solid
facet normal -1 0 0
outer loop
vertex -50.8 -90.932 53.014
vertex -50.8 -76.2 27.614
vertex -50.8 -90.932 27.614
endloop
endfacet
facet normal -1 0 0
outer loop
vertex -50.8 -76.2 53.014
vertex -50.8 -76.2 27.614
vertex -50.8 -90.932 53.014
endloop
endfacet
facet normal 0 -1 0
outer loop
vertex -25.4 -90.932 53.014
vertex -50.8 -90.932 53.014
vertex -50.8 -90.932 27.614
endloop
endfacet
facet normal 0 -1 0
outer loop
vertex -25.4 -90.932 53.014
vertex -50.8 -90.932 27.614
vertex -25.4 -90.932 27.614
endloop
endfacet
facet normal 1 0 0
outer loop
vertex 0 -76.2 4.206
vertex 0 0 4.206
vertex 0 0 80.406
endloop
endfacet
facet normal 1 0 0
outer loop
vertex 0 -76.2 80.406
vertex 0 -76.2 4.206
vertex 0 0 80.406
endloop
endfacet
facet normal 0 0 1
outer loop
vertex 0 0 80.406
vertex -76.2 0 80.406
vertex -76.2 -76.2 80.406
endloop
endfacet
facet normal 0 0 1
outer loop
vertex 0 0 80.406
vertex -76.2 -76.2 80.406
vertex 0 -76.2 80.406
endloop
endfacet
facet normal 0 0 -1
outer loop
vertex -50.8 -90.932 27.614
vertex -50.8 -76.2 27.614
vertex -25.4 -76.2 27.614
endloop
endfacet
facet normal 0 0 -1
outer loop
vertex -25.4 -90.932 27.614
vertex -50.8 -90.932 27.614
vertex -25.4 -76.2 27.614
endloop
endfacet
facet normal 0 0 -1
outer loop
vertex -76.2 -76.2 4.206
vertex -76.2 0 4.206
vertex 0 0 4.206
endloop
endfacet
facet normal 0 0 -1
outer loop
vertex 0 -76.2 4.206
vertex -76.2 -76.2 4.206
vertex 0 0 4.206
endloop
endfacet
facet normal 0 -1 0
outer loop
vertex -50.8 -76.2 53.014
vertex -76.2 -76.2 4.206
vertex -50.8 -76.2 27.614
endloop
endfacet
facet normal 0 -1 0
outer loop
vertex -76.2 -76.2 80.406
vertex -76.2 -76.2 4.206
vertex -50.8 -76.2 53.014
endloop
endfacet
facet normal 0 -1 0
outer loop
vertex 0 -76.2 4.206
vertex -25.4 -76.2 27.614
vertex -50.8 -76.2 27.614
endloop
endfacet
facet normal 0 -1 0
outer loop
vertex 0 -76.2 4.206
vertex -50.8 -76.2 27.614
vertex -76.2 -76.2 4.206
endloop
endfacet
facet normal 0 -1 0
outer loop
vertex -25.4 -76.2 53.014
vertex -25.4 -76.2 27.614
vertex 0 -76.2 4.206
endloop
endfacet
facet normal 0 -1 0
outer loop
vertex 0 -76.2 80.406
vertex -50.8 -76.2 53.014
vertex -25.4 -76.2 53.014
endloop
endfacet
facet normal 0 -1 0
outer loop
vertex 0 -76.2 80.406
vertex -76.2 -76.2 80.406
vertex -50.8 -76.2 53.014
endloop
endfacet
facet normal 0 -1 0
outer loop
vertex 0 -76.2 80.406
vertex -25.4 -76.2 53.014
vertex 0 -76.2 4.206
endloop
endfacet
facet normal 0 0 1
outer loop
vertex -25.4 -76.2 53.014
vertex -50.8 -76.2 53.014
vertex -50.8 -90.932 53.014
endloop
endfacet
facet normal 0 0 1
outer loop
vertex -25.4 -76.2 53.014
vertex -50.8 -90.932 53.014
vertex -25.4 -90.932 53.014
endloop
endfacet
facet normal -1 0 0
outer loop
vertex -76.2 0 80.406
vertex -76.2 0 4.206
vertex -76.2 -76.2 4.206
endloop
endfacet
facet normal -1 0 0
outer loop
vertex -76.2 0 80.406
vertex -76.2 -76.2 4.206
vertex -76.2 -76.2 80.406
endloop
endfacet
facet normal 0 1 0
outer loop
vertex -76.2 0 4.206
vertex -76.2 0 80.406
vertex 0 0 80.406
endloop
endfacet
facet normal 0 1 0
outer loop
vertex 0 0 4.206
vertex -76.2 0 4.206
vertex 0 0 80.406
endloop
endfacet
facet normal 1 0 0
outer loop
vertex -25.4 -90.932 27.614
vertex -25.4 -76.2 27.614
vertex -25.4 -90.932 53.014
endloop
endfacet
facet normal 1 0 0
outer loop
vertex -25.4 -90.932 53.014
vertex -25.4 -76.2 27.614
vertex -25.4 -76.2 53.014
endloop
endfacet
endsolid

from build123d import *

# Parameters (mm, degrees)
F0_W     = 76.2
F0_H     = 76.2
F1_DEPTH = 25.4
F2_DEPTH = 76.2
F3_W     = 25.4
F3_H     = 25.4
F4_DEPTH = 14.732


# Not quite as in the source:
# - the program builds the solid bodies; features that only make, move or delete a surface that nothing else refers to are left out


with BuildPart() as f1:
    # F0 (on Front) → F1 (new body)
    with BuildSketch(Plane.XZ):
        with Locations((-38.1, 42.3055109791)):
            Rectangle(F0_W, F0_H)
    extrude(amount=F1_DEPTH)

    # F0 (on Front) → F2 (join)
    with BuildSketch(Plane.XZ):
        with Locations((-38.1, 42.3055109791)):
            Rectangle(F0_W, F0_H)
    extrude(amount=F2_DEPTH)

    # F3 (on face) → F4 (join)
    with BuildSketch(Plane.XZ.offset(76.2)):
        with Locations((-38.1, 40.3138278052)):
            Rectangle(F3_W, F3_H)
    extrude(amount=F4_DEPTH)


solid = f1.part
